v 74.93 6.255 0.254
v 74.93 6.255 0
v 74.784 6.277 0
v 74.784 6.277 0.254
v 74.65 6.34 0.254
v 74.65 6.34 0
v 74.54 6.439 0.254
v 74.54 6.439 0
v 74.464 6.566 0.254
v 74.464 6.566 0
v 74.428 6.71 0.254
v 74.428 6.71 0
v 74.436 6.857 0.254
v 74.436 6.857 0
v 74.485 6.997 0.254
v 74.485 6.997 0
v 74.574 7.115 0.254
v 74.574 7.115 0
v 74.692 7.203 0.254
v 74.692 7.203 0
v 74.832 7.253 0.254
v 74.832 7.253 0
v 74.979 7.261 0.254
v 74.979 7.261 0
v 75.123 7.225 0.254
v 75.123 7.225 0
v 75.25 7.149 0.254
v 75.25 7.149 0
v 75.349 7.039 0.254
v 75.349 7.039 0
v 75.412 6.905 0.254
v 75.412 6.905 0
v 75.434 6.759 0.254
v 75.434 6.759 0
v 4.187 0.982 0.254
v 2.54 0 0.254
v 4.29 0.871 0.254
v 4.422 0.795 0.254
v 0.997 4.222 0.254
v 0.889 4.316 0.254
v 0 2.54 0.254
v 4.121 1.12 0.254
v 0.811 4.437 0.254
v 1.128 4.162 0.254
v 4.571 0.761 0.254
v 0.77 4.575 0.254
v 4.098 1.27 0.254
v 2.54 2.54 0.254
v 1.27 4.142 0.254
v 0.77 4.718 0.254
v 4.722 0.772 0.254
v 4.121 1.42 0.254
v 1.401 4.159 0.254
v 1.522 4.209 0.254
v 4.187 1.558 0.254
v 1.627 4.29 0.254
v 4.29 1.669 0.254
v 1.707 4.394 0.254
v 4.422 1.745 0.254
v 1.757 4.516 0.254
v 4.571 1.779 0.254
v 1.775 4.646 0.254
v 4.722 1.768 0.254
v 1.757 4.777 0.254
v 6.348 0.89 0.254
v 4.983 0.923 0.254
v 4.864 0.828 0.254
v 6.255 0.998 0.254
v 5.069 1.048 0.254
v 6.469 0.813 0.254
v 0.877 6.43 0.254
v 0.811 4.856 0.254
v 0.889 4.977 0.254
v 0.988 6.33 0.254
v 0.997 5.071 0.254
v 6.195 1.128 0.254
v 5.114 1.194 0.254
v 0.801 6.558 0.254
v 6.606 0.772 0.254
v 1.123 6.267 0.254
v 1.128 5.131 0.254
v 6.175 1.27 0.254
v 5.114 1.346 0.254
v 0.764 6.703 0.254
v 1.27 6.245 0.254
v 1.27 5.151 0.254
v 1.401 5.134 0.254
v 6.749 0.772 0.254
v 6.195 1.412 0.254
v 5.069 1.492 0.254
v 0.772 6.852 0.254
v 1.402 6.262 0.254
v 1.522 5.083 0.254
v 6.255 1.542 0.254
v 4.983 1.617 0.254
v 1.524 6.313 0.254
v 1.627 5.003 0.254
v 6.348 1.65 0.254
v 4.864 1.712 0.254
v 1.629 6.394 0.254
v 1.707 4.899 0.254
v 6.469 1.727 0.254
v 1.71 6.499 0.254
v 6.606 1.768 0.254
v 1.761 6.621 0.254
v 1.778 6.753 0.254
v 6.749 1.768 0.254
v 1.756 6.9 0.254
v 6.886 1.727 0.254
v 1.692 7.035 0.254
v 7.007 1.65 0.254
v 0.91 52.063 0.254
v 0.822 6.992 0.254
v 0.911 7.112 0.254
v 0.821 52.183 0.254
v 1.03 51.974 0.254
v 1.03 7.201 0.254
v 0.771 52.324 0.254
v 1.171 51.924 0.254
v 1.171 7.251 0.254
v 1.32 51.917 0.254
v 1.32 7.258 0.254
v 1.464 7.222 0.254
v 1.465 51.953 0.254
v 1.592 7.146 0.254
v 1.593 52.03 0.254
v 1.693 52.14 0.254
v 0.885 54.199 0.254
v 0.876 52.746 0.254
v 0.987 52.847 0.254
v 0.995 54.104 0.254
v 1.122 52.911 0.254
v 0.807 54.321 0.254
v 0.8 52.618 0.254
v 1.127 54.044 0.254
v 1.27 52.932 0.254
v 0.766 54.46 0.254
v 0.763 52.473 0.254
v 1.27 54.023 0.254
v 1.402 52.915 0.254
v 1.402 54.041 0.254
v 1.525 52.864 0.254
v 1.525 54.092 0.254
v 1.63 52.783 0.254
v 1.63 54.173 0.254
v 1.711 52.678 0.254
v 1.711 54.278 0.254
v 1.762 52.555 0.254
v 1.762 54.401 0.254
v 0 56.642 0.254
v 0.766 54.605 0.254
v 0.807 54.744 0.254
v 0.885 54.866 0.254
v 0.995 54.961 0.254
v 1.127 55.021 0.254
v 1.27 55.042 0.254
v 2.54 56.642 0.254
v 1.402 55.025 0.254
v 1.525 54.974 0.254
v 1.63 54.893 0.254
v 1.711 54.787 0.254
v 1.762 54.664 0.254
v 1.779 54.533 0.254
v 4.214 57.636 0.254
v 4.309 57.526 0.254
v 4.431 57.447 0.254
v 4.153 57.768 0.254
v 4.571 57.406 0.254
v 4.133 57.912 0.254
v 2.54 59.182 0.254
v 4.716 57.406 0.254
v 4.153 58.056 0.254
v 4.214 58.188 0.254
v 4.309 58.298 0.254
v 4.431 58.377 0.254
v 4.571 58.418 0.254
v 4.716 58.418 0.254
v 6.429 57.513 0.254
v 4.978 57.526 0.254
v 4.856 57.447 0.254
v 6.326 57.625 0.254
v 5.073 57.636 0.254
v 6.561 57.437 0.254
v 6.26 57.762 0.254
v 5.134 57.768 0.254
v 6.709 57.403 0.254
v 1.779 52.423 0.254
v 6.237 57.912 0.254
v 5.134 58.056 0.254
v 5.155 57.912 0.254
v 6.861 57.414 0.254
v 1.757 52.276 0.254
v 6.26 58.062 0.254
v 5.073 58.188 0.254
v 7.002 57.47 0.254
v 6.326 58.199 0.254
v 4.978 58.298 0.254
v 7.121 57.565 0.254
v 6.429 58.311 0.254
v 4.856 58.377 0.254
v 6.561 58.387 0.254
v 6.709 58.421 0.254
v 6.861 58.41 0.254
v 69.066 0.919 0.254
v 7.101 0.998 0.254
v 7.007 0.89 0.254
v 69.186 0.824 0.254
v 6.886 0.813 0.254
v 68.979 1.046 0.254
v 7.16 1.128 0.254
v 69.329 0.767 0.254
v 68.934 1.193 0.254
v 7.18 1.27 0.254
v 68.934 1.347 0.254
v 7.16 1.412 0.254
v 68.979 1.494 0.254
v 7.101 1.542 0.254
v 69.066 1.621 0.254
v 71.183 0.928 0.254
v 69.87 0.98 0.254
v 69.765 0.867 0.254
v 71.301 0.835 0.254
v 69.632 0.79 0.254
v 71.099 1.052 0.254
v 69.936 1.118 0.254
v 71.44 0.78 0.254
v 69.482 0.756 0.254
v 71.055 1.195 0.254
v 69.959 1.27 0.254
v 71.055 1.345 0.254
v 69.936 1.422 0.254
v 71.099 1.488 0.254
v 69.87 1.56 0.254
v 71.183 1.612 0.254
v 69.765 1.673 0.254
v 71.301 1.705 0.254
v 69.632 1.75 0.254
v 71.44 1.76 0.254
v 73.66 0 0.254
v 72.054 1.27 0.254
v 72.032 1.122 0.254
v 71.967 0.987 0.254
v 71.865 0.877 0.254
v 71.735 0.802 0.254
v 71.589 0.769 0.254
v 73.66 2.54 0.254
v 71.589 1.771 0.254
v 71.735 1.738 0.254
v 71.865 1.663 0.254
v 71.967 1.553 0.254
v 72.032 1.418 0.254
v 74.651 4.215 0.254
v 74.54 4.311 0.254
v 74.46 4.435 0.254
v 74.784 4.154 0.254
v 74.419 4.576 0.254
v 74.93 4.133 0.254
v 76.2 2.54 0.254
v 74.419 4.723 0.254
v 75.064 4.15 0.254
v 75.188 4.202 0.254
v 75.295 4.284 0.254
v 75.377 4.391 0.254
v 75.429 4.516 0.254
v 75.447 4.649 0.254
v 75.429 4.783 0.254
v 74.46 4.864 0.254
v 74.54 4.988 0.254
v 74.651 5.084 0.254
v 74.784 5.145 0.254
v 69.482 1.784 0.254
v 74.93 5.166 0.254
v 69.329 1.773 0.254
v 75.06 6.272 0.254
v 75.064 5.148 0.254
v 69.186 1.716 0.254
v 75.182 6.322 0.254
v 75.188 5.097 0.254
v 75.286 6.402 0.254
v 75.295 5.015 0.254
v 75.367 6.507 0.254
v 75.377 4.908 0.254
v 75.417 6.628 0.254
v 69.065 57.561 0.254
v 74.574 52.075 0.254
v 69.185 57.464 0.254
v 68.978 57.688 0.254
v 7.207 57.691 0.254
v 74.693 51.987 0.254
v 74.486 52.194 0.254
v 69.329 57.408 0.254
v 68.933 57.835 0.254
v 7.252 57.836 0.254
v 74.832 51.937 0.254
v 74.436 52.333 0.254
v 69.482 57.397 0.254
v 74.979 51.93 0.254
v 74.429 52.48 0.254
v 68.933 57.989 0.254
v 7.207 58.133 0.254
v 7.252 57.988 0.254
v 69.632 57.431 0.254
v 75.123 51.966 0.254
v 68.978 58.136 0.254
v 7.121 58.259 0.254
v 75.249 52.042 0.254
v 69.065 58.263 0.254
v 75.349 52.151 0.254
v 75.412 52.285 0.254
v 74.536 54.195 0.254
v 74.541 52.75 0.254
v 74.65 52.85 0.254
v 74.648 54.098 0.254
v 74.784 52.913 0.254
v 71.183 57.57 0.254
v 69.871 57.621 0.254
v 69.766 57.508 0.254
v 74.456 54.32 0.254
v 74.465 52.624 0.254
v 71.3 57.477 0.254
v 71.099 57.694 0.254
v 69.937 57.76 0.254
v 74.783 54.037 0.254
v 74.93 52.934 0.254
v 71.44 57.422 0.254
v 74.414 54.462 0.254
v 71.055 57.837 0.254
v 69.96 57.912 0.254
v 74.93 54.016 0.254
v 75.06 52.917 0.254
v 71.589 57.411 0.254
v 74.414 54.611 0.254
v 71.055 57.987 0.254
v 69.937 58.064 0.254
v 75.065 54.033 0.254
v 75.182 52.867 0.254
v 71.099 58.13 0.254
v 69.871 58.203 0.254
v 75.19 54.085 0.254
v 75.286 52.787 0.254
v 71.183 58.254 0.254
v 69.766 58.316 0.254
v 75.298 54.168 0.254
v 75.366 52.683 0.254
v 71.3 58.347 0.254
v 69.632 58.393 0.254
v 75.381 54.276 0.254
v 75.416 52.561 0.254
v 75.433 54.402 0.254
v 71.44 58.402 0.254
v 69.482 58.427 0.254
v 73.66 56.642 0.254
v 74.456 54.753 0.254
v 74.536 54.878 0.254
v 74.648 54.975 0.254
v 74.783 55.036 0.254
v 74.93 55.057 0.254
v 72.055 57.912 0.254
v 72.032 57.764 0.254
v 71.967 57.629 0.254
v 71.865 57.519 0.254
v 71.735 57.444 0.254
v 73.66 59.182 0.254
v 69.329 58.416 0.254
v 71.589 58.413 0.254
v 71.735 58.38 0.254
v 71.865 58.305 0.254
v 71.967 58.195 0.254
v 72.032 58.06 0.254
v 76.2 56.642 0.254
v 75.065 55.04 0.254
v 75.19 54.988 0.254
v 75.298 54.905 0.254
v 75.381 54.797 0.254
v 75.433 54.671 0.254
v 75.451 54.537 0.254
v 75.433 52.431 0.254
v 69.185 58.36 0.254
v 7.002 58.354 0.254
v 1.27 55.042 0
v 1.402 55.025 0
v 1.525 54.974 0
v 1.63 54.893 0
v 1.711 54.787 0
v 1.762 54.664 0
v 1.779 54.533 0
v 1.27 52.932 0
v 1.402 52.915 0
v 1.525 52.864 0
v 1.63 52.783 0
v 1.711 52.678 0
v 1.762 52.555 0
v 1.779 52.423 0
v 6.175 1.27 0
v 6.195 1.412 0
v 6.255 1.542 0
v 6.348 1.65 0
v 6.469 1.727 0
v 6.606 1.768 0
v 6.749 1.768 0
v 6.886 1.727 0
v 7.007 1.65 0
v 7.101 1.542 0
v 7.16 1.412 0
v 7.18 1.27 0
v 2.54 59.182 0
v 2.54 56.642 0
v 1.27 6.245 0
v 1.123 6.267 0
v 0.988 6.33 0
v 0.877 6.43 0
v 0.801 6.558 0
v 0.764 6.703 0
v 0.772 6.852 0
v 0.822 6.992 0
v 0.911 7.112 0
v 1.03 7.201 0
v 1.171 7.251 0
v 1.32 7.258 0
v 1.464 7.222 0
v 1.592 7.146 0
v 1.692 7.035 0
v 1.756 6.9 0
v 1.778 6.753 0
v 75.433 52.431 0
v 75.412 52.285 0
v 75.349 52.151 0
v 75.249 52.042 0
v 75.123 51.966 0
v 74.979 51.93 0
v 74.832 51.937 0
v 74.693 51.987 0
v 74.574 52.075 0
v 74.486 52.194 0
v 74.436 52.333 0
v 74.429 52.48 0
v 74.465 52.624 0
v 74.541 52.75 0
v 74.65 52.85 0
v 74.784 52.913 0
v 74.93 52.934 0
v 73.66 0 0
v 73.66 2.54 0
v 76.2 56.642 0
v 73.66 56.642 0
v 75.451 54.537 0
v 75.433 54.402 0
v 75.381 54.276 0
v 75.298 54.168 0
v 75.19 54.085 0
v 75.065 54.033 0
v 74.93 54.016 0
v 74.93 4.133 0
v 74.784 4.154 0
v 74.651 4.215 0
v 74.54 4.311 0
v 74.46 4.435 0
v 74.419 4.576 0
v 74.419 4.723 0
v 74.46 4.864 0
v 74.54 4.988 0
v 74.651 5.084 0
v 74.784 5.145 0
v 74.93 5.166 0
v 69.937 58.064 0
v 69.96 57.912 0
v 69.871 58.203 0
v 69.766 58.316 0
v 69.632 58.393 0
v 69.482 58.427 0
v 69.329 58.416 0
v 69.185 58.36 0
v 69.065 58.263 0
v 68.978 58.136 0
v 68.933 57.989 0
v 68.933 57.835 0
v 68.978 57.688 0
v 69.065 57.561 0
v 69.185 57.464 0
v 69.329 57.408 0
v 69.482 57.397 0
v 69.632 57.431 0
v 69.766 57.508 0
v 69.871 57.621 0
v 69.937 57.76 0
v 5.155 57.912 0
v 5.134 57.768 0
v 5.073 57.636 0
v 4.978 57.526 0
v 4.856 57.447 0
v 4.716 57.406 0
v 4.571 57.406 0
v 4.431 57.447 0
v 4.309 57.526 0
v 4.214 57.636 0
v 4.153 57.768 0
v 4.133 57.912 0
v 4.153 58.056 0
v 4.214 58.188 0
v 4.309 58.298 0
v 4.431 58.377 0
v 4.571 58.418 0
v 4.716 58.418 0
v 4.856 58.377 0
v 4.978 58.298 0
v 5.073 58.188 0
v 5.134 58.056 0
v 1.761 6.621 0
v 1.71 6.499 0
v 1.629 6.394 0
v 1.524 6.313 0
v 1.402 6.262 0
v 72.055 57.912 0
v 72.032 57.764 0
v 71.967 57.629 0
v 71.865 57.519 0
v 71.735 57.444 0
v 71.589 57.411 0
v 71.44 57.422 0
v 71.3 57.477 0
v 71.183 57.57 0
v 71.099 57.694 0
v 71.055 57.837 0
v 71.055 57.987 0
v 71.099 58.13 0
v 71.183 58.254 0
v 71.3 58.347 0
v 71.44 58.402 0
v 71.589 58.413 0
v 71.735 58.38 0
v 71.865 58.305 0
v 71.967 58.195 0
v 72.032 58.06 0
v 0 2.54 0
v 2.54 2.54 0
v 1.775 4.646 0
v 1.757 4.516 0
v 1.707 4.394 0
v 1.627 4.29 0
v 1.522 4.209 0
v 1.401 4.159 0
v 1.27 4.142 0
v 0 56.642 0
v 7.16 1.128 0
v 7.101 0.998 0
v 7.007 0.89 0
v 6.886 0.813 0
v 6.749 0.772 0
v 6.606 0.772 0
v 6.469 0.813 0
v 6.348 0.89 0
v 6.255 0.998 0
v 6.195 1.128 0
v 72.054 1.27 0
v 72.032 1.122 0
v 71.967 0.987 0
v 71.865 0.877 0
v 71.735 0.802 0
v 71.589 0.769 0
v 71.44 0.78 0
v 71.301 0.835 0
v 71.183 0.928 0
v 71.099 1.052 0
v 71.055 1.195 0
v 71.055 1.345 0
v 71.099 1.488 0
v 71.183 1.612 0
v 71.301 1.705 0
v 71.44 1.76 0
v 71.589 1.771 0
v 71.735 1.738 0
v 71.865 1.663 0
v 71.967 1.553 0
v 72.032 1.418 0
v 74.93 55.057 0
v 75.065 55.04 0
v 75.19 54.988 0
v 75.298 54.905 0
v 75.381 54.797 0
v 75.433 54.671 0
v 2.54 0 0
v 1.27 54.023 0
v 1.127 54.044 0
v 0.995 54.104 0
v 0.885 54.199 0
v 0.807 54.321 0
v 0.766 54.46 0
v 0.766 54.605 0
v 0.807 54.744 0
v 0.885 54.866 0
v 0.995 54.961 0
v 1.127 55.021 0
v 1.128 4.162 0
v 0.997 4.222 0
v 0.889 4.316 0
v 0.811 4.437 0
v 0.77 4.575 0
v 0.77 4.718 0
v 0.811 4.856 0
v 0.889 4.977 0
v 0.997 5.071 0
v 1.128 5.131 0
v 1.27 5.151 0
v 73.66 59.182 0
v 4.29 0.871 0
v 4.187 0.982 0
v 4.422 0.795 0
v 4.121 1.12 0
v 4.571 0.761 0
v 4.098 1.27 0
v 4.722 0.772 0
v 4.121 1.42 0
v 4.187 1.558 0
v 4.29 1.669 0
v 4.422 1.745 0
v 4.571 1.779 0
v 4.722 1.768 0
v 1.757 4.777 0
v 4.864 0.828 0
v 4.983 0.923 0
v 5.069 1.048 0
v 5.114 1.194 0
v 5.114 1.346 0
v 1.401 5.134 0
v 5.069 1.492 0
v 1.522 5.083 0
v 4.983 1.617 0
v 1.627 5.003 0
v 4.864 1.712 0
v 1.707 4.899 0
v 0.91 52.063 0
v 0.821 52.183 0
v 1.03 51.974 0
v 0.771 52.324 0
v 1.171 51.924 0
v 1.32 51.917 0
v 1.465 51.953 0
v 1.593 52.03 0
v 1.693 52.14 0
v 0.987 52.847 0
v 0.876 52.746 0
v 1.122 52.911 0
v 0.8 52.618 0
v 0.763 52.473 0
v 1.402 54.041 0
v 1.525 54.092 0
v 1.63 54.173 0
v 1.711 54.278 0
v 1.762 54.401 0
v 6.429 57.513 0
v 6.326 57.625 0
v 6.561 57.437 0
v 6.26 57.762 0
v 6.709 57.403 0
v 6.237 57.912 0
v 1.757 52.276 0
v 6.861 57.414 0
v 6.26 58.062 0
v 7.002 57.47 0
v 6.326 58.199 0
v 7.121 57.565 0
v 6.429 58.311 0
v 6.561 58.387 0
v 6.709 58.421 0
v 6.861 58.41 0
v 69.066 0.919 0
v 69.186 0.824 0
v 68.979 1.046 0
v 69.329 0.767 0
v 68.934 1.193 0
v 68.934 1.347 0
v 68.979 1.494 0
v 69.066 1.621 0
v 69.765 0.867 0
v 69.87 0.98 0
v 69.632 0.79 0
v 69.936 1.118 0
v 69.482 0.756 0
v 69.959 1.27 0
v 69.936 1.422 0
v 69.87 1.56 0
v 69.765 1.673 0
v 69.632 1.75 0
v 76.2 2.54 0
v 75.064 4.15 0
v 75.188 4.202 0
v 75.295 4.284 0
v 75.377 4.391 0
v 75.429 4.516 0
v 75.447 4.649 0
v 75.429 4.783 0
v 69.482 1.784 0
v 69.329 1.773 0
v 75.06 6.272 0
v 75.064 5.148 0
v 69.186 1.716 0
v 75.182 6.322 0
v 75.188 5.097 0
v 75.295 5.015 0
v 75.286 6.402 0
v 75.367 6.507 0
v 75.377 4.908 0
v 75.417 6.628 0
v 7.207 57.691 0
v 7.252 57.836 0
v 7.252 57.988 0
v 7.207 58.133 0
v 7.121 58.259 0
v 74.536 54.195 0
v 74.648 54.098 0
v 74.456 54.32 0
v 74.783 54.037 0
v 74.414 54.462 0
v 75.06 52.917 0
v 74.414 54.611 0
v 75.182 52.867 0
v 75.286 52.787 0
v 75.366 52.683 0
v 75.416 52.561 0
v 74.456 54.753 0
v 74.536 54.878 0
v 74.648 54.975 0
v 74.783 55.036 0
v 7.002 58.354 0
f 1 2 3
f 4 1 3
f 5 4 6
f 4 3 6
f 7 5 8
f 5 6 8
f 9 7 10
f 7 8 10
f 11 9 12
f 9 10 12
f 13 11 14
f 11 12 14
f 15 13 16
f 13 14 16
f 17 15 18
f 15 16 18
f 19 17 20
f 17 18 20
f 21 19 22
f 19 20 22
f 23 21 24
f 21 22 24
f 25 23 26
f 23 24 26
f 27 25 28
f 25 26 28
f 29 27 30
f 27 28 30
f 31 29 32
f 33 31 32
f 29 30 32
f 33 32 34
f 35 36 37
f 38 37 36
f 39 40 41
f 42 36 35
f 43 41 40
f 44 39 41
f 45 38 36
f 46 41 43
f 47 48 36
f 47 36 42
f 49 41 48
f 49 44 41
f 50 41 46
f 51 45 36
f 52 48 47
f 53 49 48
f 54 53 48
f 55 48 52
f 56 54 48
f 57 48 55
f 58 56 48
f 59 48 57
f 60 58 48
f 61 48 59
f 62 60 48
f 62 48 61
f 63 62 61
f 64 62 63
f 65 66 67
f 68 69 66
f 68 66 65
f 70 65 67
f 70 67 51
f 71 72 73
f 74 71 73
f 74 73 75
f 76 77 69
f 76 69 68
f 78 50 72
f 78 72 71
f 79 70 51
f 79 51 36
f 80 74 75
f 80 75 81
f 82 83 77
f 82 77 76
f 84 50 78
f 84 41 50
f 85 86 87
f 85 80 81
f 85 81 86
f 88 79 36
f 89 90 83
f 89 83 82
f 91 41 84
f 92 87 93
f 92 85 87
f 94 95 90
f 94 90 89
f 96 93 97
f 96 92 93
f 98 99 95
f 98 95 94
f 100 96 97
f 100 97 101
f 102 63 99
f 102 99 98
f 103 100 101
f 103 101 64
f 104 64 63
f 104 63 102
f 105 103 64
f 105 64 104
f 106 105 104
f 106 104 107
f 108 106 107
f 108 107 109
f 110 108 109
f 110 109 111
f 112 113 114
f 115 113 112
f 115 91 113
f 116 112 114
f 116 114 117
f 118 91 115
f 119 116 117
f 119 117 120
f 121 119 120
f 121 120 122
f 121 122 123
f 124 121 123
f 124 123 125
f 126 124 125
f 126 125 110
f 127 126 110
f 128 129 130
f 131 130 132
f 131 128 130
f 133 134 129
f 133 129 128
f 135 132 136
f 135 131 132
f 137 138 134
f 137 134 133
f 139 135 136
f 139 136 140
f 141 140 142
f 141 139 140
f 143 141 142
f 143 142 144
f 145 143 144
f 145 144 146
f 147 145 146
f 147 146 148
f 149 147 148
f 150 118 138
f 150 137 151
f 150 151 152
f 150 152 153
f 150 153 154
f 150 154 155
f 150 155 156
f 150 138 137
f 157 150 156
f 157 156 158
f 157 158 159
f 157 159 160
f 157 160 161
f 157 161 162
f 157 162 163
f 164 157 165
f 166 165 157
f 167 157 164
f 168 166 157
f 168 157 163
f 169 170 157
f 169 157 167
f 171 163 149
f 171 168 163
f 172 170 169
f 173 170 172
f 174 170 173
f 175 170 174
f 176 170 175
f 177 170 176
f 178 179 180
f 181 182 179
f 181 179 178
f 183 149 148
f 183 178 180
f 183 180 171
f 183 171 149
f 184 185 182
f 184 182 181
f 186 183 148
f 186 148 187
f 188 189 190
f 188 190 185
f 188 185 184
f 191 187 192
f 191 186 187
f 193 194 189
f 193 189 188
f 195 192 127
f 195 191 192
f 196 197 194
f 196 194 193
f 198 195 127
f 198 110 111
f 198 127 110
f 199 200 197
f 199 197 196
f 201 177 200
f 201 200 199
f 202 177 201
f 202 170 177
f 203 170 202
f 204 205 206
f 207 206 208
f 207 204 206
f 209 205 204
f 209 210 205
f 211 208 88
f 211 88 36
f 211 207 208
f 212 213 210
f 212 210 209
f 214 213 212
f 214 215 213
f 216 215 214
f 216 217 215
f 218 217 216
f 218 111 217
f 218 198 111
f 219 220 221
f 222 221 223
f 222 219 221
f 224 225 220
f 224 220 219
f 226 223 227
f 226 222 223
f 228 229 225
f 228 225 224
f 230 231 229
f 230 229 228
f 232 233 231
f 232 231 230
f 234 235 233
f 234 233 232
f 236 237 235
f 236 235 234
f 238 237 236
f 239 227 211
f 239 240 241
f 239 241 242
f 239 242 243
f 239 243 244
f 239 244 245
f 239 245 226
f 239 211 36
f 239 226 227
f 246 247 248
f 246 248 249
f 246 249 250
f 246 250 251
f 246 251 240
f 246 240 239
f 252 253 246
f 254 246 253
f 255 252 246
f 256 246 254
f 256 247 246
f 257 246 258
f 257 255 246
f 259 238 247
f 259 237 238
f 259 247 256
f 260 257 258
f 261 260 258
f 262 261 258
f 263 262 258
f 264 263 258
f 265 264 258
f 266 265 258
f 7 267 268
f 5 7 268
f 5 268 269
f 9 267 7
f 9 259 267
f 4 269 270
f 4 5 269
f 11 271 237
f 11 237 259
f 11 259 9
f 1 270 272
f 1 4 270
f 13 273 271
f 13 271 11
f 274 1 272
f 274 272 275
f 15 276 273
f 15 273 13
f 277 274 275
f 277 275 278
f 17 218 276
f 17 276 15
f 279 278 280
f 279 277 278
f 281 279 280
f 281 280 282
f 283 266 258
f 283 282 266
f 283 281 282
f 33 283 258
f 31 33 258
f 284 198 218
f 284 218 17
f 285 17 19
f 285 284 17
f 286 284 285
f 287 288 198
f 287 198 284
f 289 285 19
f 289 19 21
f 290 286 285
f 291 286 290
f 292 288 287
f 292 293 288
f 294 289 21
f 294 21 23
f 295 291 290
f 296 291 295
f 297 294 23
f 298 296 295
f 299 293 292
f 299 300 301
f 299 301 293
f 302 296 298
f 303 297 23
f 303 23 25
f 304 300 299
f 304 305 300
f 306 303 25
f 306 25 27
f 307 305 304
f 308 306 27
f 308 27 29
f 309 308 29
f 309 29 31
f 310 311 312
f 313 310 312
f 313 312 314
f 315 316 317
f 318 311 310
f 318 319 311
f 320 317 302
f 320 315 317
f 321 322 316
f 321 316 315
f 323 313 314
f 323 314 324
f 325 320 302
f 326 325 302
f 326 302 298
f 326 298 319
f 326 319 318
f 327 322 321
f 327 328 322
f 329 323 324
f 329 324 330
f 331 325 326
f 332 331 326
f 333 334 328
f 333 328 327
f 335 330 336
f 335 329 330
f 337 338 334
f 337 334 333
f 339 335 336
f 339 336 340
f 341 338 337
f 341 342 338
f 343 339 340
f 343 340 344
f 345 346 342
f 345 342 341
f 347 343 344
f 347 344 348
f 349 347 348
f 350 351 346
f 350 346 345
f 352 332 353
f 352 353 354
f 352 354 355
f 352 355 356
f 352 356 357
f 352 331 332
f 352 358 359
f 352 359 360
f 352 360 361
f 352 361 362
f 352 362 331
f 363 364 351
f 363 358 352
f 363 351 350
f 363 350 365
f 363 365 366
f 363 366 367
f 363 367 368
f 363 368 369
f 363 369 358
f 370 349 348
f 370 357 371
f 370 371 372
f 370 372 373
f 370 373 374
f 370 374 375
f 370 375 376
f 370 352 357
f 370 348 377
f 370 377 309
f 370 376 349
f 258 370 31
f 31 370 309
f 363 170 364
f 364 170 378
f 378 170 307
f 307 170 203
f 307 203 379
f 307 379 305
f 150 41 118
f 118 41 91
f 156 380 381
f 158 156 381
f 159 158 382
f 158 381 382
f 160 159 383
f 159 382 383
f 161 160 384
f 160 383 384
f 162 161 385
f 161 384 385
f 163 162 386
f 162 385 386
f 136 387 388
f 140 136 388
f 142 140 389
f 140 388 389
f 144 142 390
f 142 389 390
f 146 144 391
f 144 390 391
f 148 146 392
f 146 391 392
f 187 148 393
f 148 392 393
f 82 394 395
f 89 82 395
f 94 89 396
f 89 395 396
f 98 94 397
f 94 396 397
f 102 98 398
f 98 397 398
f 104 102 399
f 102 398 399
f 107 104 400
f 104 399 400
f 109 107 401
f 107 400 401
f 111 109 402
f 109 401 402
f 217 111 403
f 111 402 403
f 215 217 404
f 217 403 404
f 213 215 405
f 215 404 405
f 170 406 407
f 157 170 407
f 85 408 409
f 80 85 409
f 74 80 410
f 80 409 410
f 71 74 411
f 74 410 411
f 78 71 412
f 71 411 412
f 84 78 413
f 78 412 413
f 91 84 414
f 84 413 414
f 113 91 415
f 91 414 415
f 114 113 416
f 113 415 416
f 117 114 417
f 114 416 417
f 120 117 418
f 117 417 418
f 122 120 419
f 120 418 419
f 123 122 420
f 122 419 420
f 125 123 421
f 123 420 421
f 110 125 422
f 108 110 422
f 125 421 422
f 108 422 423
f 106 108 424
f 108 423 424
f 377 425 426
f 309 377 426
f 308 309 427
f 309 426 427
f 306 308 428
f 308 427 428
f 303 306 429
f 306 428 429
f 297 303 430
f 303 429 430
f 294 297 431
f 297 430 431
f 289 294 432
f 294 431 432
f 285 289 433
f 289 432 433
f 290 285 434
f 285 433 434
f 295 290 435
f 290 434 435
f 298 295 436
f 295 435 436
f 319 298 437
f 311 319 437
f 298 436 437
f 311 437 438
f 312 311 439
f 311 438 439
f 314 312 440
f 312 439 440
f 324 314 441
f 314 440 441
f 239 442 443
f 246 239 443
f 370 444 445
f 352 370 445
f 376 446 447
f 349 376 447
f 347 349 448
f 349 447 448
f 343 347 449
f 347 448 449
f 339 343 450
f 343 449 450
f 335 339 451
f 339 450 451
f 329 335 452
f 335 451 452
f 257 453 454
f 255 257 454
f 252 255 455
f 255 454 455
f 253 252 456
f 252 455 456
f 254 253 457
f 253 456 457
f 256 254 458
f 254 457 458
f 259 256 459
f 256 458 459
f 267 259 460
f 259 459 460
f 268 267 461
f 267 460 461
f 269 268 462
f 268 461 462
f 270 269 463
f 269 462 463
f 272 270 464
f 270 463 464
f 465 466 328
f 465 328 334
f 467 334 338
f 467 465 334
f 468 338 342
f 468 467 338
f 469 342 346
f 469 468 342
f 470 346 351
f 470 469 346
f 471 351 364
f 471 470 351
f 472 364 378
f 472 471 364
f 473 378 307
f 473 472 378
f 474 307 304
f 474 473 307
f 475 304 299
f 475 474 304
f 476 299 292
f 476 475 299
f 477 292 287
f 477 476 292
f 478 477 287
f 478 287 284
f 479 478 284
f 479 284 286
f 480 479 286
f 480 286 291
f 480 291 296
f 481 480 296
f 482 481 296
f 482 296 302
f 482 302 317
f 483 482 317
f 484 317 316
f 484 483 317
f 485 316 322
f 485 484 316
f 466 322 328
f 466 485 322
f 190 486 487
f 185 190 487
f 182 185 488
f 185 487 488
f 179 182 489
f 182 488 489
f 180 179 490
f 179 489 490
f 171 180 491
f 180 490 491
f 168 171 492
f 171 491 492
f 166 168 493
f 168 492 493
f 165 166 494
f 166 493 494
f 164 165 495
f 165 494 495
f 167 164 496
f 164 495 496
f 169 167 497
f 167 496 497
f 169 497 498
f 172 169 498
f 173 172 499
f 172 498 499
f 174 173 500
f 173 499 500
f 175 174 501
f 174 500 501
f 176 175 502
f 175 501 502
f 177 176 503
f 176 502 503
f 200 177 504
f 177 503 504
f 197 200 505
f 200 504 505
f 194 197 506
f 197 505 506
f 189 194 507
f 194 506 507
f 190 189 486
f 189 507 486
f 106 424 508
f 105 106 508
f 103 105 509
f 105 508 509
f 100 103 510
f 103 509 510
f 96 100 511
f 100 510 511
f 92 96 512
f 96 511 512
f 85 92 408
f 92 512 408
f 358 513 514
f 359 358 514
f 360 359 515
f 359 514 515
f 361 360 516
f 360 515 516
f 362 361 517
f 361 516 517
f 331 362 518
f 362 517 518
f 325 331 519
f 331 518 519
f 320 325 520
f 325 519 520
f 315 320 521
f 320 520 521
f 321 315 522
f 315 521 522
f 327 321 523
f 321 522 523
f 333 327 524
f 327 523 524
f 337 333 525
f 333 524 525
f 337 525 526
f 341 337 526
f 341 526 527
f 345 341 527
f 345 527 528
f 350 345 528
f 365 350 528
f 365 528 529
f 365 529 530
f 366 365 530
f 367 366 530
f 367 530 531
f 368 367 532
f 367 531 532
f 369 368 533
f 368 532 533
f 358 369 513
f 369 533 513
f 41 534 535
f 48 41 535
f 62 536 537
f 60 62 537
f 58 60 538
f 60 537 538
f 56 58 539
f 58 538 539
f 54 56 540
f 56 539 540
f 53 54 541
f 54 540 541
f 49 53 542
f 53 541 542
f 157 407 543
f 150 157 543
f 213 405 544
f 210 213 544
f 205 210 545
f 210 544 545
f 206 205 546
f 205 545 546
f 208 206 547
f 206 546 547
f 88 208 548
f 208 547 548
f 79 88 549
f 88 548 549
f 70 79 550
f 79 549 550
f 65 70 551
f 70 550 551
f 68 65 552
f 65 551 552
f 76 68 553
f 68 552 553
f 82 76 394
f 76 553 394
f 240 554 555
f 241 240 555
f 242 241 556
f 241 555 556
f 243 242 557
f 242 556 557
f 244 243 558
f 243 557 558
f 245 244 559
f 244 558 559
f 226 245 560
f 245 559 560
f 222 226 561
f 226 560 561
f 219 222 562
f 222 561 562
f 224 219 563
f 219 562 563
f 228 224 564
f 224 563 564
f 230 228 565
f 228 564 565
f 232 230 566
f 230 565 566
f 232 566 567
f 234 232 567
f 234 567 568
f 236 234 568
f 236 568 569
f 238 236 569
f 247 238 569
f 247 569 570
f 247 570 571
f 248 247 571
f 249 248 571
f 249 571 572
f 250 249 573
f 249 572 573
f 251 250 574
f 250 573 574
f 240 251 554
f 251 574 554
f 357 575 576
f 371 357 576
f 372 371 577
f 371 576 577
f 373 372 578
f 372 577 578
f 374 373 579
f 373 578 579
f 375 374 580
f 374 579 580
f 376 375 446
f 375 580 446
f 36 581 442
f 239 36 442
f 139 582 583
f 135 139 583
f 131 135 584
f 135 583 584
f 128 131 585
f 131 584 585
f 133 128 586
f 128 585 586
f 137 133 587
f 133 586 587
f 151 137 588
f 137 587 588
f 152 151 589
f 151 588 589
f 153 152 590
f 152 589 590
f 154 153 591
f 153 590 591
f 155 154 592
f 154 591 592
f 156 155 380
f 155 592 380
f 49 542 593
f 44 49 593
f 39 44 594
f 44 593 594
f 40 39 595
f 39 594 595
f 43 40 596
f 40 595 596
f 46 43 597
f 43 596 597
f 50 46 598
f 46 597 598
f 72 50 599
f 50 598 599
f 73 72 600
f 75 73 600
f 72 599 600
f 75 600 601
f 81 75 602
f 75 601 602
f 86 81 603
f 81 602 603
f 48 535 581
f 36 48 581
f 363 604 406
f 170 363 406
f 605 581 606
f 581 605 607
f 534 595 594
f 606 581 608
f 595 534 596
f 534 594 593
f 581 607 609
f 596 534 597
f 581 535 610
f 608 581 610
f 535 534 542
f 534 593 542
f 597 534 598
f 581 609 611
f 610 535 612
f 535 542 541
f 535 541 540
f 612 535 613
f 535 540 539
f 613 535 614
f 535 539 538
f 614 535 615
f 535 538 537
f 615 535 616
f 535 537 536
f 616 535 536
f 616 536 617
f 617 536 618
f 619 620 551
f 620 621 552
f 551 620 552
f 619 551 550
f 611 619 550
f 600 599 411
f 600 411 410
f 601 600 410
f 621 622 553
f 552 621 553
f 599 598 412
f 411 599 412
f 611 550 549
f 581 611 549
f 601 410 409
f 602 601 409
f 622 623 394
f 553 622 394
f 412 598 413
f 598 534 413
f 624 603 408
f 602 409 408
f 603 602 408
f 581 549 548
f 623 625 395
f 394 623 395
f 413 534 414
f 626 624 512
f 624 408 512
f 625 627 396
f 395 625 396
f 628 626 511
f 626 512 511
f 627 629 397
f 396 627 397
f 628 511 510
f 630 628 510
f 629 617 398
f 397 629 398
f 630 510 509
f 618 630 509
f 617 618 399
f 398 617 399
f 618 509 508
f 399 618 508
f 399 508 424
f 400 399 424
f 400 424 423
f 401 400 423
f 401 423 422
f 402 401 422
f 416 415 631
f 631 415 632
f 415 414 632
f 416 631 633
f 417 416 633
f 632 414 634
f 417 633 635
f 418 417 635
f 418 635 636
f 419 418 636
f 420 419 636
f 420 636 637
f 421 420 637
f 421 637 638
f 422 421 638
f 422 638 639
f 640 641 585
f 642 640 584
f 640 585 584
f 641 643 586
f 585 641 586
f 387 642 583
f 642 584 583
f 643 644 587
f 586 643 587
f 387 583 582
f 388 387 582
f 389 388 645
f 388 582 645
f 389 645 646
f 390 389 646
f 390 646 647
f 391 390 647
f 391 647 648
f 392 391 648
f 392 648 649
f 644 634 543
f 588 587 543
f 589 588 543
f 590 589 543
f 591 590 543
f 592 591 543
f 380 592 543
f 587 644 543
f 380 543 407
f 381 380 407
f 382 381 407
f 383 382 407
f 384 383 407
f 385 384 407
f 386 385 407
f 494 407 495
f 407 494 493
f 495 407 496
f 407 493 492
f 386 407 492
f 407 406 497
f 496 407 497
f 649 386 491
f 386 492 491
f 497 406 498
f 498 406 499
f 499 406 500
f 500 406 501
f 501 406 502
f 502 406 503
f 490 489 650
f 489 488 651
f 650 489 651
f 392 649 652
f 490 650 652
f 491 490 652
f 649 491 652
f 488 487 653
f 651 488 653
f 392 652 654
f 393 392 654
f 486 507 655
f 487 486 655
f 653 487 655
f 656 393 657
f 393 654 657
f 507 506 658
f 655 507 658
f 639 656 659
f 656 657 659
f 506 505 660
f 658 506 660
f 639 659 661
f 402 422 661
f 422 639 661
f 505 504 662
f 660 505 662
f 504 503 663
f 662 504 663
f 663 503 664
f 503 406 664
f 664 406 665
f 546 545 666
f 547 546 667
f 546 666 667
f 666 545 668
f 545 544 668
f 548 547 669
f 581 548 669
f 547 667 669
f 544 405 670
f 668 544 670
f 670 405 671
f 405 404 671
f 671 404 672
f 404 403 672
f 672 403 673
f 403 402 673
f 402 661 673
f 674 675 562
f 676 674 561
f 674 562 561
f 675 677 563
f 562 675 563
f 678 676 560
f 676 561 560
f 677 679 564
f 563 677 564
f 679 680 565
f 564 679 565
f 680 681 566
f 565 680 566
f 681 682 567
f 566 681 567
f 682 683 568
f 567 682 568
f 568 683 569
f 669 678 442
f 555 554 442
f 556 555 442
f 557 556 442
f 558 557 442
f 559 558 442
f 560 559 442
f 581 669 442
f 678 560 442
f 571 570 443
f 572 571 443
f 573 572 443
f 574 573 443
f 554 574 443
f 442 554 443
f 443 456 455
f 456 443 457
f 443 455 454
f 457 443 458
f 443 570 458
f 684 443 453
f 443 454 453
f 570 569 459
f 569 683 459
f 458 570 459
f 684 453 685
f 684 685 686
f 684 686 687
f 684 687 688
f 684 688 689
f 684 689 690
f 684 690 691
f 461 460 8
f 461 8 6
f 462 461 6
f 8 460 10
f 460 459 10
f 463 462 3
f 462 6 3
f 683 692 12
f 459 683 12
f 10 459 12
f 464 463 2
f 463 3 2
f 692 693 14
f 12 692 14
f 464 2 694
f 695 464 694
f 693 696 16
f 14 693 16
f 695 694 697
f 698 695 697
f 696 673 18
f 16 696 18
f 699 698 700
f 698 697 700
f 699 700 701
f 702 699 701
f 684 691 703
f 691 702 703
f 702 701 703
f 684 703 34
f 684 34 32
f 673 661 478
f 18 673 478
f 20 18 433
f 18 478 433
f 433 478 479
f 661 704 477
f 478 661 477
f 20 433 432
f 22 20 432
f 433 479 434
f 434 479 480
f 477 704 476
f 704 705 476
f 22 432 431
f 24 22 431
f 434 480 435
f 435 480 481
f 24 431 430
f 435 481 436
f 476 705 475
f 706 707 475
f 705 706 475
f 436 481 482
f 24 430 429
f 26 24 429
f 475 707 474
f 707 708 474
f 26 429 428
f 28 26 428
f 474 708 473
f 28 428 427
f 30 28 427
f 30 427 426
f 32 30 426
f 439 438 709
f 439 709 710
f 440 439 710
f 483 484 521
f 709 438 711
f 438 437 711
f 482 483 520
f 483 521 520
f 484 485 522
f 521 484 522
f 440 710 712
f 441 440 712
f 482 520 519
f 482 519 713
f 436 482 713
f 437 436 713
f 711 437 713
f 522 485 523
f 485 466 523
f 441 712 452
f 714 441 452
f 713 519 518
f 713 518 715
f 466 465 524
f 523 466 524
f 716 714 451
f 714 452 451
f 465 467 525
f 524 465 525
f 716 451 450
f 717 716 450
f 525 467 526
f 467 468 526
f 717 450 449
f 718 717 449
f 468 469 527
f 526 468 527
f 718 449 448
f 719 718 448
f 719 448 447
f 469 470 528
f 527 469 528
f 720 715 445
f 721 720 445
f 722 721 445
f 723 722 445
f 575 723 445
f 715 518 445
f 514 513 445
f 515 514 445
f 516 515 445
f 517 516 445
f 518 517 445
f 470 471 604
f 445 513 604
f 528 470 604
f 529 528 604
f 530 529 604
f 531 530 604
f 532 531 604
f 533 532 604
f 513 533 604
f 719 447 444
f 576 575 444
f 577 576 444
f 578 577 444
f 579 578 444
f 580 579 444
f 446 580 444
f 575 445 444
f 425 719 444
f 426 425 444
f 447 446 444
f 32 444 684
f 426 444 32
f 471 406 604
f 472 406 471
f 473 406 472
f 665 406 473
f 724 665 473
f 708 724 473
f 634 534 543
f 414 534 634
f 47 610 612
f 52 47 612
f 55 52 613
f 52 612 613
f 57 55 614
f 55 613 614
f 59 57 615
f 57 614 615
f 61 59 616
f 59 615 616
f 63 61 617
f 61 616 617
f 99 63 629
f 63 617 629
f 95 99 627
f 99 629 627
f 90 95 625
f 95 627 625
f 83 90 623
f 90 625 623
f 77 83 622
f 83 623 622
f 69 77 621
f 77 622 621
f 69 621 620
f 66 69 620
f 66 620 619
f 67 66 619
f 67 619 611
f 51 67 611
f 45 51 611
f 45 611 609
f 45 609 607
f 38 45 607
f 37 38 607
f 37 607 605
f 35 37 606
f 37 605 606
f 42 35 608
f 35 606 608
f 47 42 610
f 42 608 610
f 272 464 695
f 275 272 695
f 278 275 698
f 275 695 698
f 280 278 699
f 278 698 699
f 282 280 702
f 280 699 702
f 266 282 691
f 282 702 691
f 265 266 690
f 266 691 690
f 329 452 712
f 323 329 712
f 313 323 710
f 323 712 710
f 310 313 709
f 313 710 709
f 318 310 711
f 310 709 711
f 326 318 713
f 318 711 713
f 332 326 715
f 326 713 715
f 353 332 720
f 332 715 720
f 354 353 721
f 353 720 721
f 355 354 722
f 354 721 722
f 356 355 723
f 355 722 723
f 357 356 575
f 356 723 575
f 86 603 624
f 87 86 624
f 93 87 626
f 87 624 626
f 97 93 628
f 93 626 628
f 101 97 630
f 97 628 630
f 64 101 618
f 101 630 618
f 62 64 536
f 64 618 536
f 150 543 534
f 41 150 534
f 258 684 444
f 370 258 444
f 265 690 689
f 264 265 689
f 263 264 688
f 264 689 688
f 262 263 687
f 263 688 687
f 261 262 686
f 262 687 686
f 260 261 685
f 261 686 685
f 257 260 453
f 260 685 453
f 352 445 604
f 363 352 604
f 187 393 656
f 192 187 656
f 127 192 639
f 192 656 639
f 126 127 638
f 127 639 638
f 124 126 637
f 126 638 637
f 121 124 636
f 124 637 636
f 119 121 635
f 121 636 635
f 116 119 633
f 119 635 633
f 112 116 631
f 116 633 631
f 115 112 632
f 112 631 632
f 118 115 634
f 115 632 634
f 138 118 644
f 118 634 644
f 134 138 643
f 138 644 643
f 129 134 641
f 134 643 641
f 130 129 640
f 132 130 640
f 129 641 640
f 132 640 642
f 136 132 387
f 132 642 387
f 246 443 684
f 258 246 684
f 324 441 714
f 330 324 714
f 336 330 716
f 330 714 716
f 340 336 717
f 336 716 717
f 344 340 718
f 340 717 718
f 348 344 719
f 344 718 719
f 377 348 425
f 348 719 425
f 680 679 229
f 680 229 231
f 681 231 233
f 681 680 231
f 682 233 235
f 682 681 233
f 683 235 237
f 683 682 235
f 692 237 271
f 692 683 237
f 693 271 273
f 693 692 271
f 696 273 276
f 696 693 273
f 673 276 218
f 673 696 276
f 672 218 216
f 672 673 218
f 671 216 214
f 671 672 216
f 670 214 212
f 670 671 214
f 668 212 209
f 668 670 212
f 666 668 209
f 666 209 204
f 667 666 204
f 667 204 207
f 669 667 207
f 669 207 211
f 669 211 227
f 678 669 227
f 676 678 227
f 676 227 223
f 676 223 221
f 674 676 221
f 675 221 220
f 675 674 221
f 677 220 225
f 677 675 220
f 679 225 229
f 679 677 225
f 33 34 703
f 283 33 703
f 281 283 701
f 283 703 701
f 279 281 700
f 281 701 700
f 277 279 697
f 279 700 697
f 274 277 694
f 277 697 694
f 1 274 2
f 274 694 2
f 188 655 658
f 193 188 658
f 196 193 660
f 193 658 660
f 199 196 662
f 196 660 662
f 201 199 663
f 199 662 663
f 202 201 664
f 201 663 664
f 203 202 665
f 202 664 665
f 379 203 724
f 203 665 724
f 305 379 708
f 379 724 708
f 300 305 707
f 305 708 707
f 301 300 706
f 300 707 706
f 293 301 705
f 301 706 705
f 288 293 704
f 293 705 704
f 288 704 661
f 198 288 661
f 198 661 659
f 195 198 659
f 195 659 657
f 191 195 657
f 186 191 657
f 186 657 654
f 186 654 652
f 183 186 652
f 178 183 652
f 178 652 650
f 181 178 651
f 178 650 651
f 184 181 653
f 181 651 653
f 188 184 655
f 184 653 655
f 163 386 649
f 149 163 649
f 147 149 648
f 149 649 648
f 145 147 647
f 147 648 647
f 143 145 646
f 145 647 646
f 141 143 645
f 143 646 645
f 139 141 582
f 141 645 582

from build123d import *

# Parameters (mm, degrees)
F0_R     = 0.515571
F0_R_2   = 0.516732
F1_DEPTH = 0.254


with BuildPart() as f1:
    # F0 (on Top) → F1 (new body)
    with BuildSketch(Plane.XY):
        Polygon((2.54, 1.27), (2.54, 0), (73.66, 0), (73.66, 1.27), (73.66, 2.54), (74.93, 2.54), (76.2, 2.54), (76.2, 56.642), (74.93, 56.642), (73.66, 56.642), (73.66, 57.912), (73.66, 59.182), (2.54, 59.182), (2.54, 57.912), (2.54, 56.642), (1.27, 56.642), (0, 56.642), (0, 2.54), (1.27, 2.54), (2.54, 2.54), align=None)
        with BuildLine():
            ThreePointArc((5.119342, 1.27), (4.60881, 0.759468), (4.098278, 1.27))
            ThreePointArc((4.098278, 1.27), (4.60881, 1.780532), (5.119342, 1.27))
        make_face(mode=Mode.SUBTRACT)
        with BuildLine():
            ThreePointArc((7.180349, 1.27), (6.67762, 0.767271), (6.17489, 1.27))
            ThreePointArc((6.17489, 1.27), (6.67762, 1.772729), (7.180349, 1.27))
        make_face(mode=Mode.SUBTRACT)
        with BuildLine():
            ThreePointArc((1.774696, 4.646398), (1.626874, 4.289524), (1.27, 4.141702))
            ThreePointArc((1.27, 4.141702), (0.765304, 4.646398), (1.27, 5.151094))
            ThreePointArc((1.27, 5.151094), (1.626874, 5.003272), (1.774696, 4.646398))
        make_face(mode=Mode.SUBTRACT)
        with BuildLine():
            ThreePointArc((1.778091, 6.752796), (1.629275, 6.393521), (1.27, 6.244705))
            ThreePointArc((1.27, 6.244705), (0.910725, 7.112071), (1.778091, 6.752796))
        make_face(mode=Mode.SUBTRACT)
        with Locations((69.4436, 1.27)):
            Circle(F0_R, mode=Mode.SUBTRACT)
        with BuildLine():
            ThreePointArc((71.049353, 1.27), (71.5518, 1.772447), (72.054247, 1.27))
            ThreePointArc((72.054247, 1.27), (71.5518, 0.767553), (71.049353, 1.27))
        make_face(mode=Mode.SUBTRACT)
        with BuildLine():
            ThreePointArc((75.446638, 4.649455), (75.295318, 4.284136), (74.93, 4.132817))
            ThreePointArc((74.93, 4.132817), (74.413362, 4.649455), (74.93, 5.166093))
            ThreePointArc((74.93, 5.166093), (75.295318, 5.014773), (75.446638, 4.649455))
        make_face(mode=Mode.SUBTRACT)
        with BuildLine():
            ThreePointArc((75.434085, 6.758909), (75.286442, 6.402467), (74.93, 6.254824))
            ThreePointArc((74.93, 6.254824), (74.573558, 7.115351), (75.434085, 6.758909))
        make_face(mode=Mode.SUBTRACT)
        with BuildLine():
            ThreePointArc((1.779113, 52.423321), (0.910003, 52.063324), (1.27, 52.932433))
            ThreePointArc((1.27, 52.932433), (1.629997, 52.783318), (1.779113, 52.423321))
        make_face(mode=Mode.SUBTRACT)
        with BuildLine():
            ThreePointArc((1.27, 54.023341), (0.76068, 54.53266), (1.27, 55.04198))
            ThreePointArc((1.27, 55.04198), (1.630143, 54.892804), (1.77932, 54.53266))
            ThreePointArc((1.77932, 54.53266), (1.630143, 54.172517), (1.27, 54.023341))
        make_face(mode=Mode.SUBTRACT)
        with BuildLine():
            ThreePointArc((5.154588, 57.912), (4.643598, 57.401009), (4.132607, 57.912))
            ThreePointArc((4.132607, 57.912), (4.643598, 58.422991), (5.154588, 57.912))
        make_face(mode=Mode.SUBTRACT)
        with BuildLine():
            ThreePointArc((7.257511, 57.912), (6.747195, 57.401684), (6.236879, 57.912))
            ThreePointArc((6.236879, 57.912), (6.747195, 58.422316), (7.257511, 57.912))
        make_face(mode=Mode.SUBTRACT)
        with BuildLine():
            ThreePointArc((75.433384, 52.431013), (74.574054, 52.075067), (74.93, 52.934398))
            ThreePointArc((74.93, 52.934398), (75.285946, 52.78696), (75.433384, 52.431013))
        make_face(mode=Mode.SUBTRACT)
        with BuildLine():
            ThreePointArc((74.93, 54.015517), (74.409011, 54.536507), (74.93, 55.057496))
            ThreePointArc((74.93, 55.057496), (75.298395, 54.904902), (75.450989, 54.536507))
            ThreePointArc((75.450989, 54.536507), (75.298395, 54.168112), (74.93, 54.015517))
        make_face(mode=Mode.SUBTRACT)
        with Locations((69.4436, 57.912)):
            Circle(F0_R_2, mode=Mode.SUBTRACT)
        with BuildLine():
            ThreePointArc((71.049026, 57.912), (71.5518, 58.414774), (72.054574, 57.912))
            ThreePointArc((72.054574, 57.912), (71.5518, 57.409226), (71.049026, 57.912))
        make_face(mode=Mode.SUBTRACT)
    extrude(amount=F1_DEPTH)


solid = f1.part
